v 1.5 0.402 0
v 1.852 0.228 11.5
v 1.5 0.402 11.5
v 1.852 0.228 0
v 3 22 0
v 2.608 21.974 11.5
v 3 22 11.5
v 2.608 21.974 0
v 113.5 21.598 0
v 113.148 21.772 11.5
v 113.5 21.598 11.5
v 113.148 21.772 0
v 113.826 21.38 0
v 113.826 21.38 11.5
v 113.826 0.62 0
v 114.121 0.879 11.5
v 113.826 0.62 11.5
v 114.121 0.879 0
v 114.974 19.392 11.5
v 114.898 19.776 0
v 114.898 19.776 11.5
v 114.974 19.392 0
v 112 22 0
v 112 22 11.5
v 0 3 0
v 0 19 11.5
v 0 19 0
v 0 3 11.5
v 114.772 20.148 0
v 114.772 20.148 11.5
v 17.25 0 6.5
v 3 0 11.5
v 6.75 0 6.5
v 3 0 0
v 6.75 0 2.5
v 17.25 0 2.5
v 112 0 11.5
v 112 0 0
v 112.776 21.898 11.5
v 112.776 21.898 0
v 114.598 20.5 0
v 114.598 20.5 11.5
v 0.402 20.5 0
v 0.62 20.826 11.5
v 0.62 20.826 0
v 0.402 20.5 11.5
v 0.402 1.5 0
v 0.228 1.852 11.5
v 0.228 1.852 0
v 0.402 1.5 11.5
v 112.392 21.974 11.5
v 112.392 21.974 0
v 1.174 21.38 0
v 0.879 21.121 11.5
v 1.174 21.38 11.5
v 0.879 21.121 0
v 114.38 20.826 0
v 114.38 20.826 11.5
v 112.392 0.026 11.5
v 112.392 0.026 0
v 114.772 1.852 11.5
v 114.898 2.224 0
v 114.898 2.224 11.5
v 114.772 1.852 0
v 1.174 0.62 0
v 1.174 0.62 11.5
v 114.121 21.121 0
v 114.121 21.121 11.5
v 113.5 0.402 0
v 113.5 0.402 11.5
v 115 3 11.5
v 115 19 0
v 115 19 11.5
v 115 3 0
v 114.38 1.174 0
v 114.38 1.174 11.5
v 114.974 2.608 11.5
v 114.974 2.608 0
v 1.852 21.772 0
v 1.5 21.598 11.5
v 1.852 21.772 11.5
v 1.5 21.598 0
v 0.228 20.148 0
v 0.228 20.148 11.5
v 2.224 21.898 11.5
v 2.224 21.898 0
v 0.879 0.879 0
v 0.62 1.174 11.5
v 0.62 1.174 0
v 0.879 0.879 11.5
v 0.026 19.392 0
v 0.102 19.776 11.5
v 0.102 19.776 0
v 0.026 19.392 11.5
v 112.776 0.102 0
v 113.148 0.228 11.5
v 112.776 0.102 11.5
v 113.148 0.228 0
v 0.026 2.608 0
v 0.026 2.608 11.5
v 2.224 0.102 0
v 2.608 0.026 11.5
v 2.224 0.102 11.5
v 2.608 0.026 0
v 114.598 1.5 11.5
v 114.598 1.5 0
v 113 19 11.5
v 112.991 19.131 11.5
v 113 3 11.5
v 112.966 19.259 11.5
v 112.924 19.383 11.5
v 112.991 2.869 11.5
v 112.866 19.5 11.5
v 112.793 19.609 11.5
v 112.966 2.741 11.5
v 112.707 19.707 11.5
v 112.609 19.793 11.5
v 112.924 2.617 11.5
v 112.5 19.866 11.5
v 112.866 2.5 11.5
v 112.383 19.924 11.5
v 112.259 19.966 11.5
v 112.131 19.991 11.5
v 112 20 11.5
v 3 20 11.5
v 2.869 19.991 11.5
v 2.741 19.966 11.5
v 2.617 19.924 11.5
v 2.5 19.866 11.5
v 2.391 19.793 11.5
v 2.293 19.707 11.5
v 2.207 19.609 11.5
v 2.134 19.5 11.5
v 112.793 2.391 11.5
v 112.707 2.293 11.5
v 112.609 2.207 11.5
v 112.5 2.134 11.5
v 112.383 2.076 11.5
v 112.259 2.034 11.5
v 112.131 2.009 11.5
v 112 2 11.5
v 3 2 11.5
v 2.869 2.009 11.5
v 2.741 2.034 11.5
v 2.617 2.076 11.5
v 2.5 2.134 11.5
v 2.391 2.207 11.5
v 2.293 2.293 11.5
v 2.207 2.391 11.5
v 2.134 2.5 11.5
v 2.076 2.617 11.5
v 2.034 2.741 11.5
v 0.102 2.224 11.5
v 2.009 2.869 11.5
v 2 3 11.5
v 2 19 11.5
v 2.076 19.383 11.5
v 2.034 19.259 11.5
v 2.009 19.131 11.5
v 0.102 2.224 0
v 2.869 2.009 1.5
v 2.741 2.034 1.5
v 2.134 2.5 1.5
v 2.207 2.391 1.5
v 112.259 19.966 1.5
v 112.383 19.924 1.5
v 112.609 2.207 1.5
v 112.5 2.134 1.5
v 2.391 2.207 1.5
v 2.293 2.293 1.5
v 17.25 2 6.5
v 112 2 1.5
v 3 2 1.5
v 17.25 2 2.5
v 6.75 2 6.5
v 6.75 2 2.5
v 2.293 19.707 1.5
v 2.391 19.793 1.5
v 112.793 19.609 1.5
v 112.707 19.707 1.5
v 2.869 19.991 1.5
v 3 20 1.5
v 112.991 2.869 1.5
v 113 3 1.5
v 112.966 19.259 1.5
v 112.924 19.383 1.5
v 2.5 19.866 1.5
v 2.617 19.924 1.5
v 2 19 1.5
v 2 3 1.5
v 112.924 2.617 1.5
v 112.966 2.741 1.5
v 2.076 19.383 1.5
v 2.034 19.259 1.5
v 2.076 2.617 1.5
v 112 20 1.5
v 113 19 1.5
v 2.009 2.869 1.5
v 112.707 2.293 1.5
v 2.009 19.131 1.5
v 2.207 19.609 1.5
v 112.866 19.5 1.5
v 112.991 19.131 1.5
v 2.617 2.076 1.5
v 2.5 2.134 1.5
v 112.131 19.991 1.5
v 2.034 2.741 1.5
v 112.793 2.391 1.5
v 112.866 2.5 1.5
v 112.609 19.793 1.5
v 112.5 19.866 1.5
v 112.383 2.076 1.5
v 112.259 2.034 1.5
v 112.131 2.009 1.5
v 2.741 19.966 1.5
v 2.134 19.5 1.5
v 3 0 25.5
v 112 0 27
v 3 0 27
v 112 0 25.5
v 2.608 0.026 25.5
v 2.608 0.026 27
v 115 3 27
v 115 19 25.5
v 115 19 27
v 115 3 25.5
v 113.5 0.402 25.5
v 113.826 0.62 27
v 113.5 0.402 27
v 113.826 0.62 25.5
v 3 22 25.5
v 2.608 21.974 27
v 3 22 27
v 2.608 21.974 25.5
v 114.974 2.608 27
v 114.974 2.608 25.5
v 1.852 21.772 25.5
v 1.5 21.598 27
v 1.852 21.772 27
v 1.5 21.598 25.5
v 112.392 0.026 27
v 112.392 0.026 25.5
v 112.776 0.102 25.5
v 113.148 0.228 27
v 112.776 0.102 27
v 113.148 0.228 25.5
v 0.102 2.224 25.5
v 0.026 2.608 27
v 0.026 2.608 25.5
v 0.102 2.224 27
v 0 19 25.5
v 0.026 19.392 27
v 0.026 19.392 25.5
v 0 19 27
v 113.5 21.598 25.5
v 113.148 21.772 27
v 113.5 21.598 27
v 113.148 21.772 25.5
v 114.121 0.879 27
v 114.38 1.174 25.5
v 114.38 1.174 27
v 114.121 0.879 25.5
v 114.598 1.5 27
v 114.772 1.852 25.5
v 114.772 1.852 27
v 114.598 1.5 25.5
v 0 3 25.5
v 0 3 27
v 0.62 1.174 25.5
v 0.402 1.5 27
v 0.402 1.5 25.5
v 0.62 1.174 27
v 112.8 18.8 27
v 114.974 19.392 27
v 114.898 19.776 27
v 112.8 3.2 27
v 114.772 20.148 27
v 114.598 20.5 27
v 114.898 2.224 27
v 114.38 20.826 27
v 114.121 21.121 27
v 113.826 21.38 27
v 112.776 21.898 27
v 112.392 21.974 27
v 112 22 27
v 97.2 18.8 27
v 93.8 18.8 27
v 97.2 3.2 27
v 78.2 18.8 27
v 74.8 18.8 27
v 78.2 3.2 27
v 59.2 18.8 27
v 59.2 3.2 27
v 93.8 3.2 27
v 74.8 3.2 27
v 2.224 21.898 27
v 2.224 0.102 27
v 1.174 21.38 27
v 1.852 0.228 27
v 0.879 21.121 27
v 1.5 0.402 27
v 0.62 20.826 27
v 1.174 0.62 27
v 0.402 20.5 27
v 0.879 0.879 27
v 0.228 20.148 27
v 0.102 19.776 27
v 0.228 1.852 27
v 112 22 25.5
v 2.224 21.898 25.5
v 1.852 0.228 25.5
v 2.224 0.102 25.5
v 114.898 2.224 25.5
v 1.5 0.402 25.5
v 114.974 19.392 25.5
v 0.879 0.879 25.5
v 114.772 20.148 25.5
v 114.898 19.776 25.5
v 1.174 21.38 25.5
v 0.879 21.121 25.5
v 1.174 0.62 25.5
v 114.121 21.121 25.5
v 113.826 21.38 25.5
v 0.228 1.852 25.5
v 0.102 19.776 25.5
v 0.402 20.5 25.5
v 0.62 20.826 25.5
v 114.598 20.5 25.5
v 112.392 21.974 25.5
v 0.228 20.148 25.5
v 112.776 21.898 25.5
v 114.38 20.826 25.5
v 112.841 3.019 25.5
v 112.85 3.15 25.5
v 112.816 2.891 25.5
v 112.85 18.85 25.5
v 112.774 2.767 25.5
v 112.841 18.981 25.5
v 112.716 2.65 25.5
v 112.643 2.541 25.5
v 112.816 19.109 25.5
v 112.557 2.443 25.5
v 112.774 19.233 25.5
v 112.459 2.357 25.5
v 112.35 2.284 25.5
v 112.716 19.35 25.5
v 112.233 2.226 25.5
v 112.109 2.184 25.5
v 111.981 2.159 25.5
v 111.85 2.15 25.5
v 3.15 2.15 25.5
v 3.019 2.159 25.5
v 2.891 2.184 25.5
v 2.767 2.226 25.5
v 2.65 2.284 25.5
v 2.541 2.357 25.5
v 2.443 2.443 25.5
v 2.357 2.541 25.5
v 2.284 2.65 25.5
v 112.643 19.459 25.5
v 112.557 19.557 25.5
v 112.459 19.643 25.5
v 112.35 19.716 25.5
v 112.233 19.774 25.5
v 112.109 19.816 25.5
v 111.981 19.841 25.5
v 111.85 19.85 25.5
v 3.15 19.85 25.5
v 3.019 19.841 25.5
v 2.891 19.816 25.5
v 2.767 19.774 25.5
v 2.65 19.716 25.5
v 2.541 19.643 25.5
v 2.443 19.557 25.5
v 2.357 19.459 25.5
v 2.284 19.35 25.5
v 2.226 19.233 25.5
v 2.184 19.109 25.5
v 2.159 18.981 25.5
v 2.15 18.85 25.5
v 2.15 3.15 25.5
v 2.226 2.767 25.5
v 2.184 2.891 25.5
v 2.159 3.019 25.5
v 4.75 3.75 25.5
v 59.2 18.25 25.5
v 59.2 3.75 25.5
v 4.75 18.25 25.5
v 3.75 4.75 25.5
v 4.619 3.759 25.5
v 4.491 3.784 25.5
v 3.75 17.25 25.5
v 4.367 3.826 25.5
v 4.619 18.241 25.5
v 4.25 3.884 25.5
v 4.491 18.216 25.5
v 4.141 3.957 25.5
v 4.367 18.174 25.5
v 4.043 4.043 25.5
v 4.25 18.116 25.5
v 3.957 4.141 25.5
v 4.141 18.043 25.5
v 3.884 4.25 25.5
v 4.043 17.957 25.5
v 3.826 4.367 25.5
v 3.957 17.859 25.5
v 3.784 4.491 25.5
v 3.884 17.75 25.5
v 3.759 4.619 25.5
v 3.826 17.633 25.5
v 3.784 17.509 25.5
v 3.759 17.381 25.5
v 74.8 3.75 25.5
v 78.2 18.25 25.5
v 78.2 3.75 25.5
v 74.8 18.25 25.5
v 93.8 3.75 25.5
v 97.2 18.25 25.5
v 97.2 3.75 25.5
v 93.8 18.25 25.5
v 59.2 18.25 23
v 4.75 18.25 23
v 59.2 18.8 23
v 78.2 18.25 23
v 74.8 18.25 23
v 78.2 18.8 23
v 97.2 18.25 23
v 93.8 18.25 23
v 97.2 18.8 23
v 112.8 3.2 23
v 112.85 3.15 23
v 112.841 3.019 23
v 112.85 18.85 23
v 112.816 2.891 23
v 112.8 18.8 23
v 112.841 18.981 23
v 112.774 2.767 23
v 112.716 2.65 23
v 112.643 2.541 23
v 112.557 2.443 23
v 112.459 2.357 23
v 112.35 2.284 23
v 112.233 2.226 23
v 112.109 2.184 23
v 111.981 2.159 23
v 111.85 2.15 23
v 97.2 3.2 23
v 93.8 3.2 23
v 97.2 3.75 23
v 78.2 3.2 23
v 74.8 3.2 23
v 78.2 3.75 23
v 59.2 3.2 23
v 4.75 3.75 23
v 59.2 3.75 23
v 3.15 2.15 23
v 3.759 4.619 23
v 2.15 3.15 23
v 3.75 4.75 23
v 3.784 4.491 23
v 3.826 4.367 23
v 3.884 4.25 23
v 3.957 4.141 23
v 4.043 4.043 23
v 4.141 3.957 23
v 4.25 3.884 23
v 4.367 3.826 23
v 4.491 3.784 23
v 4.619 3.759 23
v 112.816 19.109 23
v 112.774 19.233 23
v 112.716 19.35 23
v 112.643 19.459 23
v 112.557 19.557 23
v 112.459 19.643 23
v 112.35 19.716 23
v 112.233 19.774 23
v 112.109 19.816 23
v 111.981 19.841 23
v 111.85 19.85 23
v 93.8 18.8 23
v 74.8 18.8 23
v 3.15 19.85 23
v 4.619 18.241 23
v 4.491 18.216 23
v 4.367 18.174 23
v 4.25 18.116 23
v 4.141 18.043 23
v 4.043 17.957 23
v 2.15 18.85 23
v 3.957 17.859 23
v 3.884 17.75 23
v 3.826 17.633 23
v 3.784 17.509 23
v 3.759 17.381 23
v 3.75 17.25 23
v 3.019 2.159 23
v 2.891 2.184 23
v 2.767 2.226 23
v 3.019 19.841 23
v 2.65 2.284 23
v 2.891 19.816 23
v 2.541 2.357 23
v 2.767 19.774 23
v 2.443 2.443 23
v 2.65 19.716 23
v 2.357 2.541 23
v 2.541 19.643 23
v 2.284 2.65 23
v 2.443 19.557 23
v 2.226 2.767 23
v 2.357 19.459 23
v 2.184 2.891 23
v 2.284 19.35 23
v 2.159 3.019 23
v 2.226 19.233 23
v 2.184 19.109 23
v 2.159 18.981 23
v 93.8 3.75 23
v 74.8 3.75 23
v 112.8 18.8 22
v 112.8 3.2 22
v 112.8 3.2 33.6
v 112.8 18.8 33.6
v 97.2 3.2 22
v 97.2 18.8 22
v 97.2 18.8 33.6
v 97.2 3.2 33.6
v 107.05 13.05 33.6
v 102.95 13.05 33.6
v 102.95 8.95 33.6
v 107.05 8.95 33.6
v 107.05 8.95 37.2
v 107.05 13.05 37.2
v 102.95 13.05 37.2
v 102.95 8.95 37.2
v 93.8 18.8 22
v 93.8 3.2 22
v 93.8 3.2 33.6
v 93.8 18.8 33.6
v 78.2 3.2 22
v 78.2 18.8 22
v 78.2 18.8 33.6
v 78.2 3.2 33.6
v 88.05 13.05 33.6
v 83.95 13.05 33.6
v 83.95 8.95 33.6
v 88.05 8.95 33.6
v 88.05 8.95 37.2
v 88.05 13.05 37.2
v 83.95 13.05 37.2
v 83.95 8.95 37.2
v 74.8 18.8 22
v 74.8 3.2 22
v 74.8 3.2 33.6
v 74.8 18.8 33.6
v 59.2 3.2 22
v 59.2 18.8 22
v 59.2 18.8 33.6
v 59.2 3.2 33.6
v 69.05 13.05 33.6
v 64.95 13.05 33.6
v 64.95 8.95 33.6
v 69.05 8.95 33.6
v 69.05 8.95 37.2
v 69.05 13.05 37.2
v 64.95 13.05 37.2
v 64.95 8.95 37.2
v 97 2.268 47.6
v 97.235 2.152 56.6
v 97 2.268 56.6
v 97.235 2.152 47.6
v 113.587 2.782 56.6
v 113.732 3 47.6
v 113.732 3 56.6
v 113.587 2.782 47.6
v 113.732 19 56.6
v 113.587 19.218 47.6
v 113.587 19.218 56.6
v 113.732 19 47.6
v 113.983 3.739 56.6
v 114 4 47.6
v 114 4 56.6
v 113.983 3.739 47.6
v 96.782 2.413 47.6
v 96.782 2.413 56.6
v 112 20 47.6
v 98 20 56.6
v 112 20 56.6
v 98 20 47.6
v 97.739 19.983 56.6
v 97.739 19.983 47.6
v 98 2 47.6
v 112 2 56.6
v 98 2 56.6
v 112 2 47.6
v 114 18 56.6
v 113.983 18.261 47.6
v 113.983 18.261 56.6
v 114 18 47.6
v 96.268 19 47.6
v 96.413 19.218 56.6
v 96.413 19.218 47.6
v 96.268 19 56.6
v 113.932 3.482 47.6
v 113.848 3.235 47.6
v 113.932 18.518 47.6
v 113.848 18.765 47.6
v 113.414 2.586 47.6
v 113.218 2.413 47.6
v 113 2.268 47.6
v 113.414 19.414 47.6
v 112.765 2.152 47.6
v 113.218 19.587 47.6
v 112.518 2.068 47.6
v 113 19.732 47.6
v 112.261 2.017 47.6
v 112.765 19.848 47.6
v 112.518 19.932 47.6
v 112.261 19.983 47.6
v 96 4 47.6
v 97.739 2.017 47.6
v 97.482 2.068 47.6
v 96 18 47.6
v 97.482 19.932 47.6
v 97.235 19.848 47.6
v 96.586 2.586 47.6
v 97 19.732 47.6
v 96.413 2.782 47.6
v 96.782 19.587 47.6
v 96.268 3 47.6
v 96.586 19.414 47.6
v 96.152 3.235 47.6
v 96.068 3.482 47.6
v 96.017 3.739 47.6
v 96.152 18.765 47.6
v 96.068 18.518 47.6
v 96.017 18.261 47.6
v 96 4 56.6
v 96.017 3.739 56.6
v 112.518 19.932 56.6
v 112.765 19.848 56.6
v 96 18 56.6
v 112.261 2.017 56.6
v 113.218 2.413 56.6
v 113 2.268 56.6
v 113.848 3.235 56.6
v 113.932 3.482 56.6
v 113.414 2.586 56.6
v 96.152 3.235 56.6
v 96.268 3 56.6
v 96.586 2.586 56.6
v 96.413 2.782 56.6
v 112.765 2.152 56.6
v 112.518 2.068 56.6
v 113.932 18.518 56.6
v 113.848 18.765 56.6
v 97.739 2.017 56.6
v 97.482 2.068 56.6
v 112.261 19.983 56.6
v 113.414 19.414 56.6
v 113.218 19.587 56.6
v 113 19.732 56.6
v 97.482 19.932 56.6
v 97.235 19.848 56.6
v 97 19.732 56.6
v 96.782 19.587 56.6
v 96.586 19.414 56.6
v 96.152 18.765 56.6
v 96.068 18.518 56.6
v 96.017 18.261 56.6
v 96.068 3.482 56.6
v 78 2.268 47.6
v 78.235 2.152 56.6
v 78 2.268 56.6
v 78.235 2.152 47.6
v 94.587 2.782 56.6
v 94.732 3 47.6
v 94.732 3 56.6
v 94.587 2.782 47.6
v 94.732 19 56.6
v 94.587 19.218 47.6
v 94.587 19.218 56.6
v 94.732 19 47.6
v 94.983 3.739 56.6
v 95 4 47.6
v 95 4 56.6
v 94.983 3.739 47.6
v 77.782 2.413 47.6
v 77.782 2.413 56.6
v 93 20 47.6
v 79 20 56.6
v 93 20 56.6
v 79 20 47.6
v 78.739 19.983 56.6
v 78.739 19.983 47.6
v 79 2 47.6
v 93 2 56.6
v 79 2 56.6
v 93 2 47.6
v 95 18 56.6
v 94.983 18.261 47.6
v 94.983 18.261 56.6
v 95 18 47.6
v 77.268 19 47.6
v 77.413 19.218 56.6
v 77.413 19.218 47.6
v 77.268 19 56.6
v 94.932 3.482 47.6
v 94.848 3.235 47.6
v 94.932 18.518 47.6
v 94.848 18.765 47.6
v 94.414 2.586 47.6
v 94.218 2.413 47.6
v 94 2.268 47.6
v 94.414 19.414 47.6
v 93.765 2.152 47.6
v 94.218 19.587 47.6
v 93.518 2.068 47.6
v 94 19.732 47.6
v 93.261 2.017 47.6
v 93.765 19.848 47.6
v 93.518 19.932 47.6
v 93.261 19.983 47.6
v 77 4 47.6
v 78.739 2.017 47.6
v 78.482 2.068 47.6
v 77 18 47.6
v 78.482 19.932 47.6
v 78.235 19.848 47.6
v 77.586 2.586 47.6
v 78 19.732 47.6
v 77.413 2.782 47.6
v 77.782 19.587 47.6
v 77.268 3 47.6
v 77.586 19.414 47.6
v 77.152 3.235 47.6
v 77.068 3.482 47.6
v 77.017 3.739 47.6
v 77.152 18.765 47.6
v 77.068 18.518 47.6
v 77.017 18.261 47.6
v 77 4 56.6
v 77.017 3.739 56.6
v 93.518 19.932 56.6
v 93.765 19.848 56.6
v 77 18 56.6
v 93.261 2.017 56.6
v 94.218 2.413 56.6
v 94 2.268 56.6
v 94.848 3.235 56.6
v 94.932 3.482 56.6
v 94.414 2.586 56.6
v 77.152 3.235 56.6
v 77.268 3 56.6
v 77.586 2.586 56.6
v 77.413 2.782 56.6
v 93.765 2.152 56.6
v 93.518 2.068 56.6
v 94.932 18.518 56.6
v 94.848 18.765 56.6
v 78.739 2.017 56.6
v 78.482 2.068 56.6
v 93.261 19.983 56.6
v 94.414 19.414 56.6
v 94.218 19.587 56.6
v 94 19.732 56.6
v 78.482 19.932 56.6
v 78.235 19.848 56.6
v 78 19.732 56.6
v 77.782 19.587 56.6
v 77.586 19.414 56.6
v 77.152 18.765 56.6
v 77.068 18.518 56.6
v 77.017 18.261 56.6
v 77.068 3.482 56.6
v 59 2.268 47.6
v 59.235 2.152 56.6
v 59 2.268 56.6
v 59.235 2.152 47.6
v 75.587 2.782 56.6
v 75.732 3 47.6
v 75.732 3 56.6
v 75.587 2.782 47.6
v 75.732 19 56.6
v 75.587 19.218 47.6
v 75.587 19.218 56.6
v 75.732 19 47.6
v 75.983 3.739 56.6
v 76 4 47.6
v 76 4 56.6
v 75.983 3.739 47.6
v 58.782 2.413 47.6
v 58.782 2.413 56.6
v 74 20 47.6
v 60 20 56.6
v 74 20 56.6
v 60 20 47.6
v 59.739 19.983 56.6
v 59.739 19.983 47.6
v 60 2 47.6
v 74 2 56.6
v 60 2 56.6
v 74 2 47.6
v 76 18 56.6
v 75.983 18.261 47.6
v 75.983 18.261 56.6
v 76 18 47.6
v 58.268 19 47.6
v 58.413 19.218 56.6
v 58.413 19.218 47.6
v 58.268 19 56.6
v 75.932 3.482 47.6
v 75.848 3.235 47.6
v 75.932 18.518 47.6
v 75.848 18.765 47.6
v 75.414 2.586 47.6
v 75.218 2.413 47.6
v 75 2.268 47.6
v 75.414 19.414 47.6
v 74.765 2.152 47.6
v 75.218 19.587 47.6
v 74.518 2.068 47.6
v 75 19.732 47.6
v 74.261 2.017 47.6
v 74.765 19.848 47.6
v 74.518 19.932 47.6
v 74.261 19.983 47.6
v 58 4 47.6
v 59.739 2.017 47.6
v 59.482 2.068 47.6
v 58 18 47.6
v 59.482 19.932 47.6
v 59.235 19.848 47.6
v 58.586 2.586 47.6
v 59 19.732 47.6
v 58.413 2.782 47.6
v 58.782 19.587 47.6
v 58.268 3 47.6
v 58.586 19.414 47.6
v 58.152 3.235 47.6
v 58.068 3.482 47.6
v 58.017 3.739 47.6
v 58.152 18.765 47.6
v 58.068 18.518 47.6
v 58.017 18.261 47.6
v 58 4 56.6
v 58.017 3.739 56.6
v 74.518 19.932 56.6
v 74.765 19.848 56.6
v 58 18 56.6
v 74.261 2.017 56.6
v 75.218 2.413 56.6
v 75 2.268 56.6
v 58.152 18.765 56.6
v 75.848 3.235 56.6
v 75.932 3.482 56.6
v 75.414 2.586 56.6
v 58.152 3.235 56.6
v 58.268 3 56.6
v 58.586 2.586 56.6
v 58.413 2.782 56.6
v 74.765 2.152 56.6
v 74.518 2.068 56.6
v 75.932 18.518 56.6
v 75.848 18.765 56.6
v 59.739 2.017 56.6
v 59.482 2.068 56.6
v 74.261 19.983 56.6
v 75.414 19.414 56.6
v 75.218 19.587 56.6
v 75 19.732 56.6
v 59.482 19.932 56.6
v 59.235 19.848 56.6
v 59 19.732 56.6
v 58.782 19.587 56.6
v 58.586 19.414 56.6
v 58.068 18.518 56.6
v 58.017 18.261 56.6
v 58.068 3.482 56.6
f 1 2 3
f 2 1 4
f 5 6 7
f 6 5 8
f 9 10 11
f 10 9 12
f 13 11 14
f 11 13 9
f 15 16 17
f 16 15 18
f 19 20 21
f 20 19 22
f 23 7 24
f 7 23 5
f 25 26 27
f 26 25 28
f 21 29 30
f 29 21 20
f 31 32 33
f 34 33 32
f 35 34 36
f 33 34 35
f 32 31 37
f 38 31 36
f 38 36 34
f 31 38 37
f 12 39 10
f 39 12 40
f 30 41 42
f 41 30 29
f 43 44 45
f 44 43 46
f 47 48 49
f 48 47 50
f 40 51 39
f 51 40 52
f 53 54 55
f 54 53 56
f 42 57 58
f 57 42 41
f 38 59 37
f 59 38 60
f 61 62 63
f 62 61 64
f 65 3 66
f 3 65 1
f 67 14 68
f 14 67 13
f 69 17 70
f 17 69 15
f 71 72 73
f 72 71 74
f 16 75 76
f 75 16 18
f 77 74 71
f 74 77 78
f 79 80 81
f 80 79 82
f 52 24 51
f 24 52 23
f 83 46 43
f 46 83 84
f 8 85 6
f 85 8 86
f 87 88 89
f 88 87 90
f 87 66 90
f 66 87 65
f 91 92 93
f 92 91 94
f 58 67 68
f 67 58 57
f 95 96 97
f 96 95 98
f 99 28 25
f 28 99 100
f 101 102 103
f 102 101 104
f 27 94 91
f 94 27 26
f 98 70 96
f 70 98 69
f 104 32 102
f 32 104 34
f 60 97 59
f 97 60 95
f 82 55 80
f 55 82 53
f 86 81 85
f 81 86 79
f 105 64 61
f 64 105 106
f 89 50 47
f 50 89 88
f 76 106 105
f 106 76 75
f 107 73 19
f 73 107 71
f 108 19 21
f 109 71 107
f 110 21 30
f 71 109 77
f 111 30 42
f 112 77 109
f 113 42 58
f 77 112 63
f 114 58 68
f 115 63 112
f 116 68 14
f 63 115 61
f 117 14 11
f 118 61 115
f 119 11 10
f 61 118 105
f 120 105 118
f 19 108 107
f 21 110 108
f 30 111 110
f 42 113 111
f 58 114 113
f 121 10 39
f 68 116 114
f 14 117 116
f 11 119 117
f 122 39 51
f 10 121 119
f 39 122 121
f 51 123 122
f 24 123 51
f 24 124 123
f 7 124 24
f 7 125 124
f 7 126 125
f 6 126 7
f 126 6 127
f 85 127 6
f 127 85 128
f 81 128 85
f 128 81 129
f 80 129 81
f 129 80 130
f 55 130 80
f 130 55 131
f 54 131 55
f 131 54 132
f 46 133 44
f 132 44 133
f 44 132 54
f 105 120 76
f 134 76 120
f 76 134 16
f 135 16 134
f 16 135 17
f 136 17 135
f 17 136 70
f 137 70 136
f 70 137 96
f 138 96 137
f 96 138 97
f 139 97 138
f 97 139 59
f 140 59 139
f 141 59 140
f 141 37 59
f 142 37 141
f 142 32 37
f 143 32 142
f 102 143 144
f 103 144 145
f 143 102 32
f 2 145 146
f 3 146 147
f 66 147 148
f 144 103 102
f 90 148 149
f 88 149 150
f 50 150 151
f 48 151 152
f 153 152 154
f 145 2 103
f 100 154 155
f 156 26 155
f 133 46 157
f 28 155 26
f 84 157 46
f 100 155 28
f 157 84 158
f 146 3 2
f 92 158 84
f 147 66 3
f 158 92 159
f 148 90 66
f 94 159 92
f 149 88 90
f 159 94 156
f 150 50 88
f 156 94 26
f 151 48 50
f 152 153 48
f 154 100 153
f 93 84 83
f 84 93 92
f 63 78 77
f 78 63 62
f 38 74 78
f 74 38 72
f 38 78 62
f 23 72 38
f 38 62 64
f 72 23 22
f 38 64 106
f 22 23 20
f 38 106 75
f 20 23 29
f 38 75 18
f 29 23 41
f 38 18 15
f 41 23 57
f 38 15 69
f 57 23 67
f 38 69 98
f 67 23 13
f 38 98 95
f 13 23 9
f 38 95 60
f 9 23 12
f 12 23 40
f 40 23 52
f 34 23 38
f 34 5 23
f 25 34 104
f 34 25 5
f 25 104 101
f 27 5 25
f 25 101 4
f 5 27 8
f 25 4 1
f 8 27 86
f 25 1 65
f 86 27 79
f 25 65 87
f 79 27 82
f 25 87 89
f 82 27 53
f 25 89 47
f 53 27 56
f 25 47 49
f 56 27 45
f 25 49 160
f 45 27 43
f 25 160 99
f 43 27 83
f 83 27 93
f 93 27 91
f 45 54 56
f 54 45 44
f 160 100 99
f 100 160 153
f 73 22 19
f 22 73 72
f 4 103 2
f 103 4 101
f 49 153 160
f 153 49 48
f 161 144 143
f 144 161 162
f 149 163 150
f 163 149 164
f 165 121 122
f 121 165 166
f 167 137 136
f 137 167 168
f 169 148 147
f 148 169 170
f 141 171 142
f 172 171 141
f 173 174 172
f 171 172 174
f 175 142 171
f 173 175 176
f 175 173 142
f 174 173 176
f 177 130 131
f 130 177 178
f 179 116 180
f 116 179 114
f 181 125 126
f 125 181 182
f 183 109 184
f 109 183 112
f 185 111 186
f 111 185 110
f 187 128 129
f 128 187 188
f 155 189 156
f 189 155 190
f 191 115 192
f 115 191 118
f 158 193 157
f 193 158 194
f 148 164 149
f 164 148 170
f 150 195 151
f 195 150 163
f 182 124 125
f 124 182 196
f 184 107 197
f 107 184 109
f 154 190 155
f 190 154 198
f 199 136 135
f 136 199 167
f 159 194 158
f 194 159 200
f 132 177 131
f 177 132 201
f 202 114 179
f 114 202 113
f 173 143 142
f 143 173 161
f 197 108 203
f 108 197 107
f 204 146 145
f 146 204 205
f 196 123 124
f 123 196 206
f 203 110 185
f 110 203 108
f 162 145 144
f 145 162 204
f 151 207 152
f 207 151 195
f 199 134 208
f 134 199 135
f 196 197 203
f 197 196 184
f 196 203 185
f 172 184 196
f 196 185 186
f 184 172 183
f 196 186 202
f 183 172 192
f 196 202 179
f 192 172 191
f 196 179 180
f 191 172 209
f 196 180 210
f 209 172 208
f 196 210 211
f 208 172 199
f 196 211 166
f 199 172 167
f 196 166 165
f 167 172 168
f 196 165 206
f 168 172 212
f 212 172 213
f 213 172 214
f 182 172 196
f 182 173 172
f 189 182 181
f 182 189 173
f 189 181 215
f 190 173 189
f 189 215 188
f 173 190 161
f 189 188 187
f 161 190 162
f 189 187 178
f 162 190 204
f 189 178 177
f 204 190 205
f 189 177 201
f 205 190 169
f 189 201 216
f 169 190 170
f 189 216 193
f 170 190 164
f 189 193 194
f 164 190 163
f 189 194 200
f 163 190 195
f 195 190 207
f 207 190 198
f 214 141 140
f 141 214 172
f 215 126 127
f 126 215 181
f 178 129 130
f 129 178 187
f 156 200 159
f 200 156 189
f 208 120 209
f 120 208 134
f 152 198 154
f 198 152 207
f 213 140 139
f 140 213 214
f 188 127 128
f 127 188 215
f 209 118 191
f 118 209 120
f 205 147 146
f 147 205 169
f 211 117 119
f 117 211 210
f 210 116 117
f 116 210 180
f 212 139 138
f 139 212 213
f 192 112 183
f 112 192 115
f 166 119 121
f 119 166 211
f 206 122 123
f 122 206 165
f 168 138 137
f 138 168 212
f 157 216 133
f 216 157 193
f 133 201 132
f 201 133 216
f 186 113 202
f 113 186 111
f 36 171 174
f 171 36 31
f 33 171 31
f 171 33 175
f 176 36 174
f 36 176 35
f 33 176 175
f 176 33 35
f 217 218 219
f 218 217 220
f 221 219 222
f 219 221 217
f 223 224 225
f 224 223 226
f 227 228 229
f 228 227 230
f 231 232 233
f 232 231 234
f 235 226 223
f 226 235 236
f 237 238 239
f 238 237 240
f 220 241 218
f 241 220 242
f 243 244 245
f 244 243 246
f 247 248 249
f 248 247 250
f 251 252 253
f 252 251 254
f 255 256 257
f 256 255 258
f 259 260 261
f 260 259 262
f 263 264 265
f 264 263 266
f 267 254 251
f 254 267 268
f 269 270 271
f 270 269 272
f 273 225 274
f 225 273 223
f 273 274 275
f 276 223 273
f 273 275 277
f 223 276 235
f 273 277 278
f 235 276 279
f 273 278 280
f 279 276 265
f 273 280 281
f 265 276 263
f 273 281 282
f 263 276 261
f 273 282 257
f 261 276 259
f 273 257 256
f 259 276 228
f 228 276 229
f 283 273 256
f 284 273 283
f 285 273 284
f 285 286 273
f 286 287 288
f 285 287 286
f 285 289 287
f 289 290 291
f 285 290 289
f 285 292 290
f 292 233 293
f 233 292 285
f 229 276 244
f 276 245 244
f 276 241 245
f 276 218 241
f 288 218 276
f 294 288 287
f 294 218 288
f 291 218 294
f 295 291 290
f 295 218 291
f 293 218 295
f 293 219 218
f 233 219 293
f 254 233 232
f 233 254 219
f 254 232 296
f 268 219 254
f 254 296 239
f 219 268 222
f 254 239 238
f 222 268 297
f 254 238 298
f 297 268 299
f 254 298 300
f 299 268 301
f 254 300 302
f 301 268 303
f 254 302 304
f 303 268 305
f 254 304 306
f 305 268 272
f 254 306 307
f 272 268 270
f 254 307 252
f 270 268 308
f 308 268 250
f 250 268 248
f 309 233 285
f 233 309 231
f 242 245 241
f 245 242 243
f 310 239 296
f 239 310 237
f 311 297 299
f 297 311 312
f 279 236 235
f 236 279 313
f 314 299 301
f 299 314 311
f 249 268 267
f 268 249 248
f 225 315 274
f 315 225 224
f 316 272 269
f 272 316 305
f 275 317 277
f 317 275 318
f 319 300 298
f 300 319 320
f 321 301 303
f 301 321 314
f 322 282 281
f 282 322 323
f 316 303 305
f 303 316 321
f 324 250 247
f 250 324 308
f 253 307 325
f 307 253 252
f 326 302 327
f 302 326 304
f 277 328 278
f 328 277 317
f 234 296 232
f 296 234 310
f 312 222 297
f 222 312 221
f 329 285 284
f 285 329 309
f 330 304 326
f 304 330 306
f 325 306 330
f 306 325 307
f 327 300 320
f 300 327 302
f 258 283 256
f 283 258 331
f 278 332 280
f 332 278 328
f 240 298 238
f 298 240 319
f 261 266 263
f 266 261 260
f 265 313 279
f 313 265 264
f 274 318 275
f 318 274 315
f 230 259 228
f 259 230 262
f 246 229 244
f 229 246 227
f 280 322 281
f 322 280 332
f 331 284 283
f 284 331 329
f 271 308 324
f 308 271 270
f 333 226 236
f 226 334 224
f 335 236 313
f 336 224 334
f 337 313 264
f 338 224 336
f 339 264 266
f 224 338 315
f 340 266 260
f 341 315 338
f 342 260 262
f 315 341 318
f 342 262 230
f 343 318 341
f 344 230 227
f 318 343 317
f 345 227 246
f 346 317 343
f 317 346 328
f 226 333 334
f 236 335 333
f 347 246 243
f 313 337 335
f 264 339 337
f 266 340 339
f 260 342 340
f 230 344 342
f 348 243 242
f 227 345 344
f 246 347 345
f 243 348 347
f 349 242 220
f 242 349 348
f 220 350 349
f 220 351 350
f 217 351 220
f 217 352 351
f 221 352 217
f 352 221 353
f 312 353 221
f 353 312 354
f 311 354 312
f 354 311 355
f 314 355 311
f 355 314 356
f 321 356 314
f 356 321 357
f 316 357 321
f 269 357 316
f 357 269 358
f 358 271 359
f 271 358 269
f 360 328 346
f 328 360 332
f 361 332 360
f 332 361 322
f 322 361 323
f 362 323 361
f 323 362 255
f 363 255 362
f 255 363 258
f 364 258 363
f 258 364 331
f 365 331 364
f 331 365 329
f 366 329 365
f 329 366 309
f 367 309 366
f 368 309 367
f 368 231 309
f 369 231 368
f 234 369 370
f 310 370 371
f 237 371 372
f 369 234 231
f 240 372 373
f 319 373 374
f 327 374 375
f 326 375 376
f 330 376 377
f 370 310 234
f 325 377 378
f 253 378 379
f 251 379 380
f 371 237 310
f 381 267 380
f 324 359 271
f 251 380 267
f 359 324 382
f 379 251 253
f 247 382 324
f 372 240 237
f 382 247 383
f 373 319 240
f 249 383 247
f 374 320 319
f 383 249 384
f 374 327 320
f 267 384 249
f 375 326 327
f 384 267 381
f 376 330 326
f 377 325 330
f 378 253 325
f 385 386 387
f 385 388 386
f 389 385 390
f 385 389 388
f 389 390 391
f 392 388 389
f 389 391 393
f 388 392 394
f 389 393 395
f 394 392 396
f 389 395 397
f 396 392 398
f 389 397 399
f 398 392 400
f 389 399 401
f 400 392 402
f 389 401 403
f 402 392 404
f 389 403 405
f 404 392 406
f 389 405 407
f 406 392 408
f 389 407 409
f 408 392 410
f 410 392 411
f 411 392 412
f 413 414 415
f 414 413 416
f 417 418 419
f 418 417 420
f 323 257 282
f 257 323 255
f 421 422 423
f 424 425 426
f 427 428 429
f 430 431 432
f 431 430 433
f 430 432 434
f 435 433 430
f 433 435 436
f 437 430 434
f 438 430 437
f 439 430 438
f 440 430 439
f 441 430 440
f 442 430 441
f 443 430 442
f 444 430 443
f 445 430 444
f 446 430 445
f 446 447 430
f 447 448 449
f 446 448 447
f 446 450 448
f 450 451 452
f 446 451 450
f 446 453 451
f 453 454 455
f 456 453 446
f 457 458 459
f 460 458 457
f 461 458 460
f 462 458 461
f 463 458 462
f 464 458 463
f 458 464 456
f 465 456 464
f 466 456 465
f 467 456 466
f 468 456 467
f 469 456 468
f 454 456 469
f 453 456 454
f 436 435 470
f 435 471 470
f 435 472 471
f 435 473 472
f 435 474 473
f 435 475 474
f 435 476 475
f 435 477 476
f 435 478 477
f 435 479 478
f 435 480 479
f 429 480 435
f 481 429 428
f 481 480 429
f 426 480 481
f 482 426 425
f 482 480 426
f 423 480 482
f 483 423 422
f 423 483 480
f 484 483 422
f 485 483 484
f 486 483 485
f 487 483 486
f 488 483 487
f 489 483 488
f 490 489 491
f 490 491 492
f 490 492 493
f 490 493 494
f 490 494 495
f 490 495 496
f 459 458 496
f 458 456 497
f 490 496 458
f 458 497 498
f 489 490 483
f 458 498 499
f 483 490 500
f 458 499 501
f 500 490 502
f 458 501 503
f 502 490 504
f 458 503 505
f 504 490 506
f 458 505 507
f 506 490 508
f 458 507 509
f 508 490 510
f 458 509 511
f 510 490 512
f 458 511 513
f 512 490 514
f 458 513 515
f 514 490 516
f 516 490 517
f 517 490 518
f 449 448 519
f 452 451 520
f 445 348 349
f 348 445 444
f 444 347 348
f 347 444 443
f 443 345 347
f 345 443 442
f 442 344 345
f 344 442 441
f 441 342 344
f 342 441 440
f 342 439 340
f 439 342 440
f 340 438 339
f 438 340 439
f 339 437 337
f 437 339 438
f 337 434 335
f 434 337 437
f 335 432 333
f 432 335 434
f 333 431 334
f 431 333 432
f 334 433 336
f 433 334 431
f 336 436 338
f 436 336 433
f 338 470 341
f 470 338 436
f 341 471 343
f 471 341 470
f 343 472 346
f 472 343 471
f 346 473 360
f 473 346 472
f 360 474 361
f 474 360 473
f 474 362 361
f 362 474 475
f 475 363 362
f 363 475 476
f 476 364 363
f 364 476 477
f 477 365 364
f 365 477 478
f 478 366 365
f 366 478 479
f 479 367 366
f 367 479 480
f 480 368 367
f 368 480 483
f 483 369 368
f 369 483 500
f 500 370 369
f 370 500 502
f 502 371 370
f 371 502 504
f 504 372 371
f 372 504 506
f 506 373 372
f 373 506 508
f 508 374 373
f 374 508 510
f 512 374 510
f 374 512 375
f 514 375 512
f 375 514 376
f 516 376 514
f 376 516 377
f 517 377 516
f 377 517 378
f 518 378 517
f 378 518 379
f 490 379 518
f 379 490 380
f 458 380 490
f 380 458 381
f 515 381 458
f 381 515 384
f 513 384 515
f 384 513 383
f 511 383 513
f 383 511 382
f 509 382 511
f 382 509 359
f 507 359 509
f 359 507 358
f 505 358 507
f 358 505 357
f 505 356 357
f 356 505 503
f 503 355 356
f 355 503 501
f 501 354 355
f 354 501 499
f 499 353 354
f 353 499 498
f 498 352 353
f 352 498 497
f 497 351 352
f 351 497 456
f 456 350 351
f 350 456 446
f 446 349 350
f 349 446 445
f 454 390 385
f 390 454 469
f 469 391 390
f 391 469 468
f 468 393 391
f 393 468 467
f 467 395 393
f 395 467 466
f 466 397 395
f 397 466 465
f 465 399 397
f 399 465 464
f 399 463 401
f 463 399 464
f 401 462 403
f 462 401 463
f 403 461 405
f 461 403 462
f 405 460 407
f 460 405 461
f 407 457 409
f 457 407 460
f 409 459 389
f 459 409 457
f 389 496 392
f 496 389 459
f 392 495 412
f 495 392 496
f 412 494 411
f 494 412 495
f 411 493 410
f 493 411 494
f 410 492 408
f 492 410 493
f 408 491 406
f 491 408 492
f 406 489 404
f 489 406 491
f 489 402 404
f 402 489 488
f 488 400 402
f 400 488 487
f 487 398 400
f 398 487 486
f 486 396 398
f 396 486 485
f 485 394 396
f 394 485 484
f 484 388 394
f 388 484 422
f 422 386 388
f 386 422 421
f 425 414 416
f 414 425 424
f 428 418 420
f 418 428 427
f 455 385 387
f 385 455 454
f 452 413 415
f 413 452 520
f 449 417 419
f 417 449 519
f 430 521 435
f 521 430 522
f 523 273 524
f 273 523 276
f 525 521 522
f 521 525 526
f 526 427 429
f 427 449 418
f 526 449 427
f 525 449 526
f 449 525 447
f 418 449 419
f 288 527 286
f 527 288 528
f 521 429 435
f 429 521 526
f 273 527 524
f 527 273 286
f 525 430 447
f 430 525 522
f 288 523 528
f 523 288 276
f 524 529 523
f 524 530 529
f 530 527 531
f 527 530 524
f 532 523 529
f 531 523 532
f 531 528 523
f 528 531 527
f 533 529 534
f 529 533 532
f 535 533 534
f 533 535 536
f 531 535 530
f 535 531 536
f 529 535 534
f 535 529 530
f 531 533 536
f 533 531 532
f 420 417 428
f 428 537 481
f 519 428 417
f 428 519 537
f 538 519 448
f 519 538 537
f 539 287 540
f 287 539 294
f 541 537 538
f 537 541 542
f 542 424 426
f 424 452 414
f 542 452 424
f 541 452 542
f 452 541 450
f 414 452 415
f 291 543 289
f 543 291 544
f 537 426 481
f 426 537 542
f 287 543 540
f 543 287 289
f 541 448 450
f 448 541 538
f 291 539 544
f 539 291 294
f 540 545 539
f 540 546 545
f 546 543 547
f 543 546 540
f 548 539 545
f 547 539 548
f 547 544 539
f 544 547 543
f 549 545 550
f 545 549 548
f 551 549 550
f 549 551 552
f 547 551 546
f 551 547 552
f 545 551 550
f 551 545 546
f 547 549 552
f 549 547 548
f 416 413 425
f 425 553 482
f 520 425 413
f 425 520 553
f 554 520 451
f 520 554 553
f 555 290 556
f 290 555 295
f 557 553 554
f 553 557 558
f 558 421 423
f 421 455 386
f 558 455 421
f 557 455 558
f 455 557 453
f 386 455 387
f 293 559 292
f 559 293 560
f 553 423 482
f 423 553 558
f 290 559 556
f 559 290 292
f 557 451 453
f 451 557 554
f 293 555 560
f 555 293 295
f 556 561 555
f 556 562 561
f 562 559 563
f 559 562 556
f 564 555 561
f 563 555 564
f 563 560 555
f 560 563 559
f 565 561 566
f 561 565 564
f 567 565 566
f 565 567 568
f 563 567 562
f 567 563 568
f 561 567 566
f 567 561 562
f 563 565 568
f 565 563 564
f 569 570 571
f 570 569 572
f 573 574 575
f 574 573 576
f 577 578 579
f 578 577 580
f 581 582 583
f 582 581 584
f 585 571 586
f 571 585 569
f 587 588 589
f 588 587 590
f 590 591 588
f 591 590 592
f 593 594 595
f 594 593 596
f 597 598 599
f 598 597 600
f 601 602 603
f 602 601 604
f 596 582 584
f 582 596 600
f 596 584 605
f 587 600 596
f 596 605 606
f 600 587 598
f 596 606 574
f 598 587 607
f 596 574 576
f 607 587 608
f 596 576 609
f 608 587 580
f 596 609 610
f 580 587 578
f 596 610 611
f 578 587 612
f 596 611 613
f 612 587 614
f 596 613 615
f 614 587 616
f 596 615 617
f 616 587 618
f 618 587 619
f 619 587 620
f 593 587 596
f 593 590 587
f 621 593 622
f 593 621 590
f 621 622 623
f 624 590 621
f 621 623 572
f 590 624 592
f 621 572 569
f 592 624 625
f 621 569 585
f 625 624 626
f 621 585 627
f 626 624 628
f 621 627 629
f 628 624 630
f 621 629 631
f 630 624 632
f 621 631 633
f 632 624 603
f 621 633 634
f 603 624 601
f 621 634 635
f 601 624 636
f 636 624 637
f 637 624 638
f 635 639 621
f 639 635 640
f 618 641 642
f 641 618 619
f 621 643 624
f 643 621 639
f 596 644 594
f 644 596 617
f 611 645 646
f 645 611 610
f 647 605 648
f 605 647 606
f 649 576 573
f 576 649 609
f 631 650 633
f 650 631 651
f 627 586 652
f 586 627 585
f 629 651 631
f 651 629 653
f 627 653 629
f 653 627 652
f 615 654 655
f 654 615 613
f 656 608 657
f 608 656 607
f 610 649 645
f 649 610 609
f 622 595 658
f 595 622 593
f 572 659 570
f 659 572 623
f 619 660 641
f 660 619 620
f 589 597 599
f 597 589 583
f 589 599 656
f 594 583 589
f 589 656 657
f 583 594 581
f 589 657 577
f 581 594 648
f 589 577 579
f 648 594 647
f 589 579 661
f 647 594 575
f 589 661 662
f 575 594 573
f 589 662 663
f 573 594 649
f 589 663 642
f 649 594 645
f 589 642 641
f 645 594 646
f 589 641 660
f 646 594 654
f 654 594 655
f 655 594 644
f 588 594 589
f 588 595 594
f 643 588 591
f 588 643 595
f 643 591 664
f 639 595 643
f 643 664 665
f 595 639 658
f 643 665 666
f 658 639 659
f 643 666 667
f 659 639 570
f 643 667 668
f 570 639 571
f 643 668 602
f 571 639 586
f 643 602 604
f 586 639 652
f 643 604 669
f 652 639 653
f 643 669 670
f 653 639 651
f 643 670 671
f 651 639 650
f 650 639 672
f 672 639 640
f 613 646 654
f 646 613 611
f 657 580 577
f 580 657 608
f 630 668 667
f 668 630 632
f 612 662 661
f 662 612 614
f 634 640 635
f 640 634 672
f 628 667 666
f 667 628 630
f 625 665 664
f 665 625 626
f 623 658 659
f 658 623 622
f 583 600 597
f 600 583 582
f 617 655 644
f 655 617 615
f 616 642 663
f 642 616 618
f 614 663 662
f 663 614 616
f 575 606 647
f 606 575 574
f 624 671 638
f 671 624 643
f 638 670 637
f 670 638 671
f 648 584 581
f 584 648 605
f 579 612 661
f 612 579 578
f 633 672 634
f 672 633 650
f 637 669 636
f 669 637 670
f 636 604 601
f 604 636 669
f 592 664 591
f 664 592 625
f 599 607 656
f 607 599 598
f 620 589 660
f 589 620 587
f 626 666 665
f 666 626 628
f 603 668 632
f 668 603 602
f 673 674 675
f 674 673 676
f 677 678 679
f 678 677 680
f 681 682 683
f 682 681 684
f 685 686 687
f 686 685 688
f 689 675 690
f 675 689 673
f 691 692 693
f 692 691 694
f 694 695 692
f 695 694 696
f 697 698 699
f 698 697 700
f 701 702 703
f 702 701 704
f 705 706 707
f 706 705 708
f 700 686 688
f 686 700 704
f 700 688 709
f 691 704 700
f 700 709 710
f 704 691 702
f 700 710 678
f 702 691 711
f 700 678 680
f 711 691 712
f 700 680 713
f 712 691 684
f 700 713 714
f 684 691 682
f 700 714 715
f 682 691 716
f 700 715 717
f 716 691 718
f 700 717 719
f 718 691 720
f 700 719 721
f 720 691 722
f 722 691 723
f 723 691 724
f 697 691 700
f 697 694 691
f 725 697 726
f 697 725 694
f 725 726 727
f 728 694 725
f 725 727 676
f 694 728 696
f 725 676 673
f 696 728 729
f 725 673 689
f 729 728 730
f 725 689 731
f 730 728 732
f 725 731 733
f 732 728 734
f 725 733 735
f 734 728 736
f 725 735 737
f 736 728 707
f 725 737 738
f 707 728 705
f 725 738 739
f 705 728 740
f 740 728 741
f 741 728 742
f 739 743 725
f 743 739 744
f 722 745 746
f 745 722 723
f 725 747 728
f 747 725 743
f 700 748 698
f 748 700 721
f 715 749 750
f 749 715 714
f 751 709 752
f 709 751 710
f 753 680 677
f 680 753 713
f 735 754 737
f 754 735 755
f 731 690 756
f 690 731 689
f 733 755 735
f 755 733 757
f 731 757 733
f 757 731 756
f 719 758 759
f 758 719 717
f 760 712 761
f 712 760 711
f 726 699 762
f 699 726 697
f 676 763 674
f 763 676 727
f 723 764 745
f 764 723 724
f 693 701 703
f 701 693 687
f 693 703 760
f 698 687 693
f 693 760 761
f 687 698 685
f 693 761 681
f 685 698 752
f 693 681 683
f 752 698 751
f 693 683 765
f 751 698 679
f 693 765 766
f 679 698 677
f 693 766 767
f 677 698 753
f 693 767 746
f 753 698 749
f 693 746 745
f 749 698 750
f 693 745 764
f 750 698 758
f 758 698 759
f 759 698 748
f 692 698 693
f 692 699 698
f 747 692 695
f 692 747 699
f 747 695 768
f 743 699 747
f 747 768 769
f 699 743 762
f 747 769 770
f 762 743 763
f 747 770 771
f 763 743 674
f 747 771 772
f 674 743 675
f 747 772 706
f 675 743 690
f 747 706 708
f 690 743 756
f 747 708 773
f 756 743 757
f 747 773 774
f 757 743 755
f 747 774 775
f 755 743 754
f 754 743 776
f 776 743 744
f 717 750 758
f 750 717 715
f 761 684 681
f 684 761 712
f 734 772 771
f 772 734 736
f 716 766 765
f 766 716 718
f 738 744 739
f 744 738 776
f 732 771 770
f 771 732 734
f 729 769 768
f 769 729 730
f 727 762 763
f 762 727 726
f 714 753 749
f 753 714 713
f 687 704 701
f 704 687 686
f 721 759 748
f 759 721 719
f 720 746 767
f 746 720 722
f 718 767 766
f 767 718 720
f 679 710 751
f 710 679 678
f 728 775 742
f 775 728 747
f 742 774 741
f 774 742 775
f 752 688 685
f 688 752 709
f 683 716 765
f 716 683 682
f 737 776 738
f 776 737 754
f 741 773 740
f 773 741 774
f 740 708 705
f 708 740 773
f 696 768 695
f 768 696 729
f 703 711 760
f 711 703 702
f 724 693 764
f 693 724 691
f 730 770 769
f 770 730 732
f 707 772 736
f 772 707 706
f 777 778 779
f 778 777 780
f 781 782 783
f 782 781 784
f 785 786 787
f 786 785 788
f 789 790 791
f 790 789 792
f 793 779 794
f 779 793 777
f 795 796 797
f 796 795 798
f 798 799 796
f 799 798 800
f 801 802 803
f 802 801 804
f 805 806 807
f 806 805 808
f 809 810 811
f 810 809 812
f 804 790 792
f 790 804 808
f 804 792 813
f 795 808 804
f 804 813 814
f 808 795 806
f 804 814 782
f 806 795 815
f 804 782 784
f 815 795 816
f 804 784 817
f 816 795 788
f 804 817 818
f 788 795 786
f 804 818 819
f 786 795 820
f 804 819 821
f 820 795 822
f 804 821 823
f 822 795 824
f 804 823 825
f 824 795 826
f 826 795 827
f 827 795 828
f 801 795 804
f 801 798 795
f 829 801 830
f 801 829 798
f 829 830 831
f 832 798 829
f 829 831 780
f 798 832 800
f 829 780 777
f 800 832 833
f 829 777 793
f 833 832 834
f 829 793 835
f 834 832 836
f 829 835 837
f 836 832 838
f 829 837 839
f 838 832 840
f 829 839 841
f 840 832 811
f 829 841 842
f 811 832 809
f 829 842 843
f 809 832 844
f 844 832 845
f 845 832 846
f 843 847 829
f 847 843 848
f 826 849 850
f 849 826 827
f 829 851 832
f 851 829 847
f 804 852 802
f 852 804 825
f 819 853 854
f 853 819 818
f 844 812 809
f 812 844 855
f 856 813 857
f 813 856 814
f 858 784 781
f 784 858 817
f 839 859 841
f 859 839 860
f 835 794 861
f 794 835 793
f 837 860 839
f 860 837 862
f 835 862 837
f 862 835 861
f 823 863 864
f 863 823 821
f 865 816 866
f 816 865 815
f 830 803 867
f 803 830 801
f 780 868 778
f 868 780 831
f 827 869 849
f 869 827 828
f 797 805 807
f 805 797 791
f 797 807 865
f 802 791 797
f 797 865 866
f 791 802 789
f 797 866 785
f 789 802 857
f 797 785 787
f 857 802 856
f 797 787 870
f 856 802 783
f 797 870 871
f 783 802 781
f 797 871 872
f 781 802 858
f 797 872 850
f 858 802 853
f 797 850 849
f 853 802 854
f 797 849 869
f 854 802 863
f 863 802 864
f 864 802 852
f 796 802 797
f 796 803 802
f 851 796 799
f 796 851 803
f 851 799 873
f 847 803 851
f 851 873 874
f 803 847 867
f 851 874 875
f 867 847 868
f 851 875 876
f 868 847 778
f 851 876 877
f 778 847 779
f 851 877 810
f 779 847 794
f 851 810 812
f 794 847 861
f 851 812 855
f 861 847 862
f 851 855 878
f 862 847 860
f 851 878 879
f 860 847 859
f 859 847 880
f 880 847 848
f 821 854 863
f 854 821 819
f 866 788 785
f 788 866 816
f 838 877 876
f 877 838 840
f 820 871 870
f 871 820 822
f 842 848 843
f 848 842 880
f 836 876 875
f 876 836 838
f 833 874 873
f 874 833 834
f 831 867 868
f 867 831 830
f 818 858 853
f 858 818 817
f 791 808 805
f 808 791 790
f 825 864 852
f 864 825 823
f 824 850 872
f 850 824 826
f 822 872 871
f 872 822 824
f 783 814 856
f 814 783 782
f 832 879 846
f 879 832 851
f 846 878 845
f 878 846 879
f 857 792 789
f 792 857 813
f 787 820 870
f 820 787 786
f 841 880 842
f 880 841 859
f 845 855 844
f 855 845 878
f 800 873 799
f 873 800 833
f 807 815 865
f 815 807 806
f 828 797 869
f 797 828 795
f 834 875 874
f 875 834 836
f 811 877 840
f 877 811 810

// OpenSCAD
// K1 (Keys v1) — printable 2-part concept, v0.4
// Parts: tray (electronics cavity) + friction-fit lid that doubles as an
// MX switch plate. Keycaps are printed separately (any MX cross-stem cap
// works — e.g. the Lego-style caps).
//
// Sized for MX-style clicky switches (PCB/plate mount, through-hole):
//   body 15.6 sq, plate cutout 14.0 sq in a 1.5mm plate (clips grab the
//   plate underside), lower housing ~5mm below plate, pins ~3.3mm more.
// Body/plug dimensions remain placeholders until the MacBook is measured.
//
// Render one part at a time:
//   openscad -D 'part="tray"' -o k1_tray.stl k1_v1_parts.scad
//   openscad -D 'part="lid"'  -o k1_lid.stl  k1_v1_parts.scad   (print orientation)
//   part="assembly" / part="exploded" for viewing (includes mock switches/caps)

part = "exploded"; // tray | lid | assembly | exploded

$fn = 48;

/* ---------- Body ---------- */
body_len  = 115;   // rear (port) to laptop front edge
body_wid  = 22;
body_rad  = 3;

wall      = 2;     // side wall thickness
floor_th  = 1.5;
cav_depth = 10;    // below-plate room: 5 switch + 3.3 pins + wiring

/* ---------- Lid = switch plate ---------- */
lid_th        = 1.5;   // MX clips are made for a 1.5mm plate — don't change
lid_rim_depth = 2.5;   // perimeter rim that friction-fits into the tray
lid_rim_wid   = 1.6;
fit_clr       = 0.15;  // per-side clearance, tune per printer

tray_ht = floor_th + cav_depth;          // 11.5
body_ht = tray_ht + lid_th;              // 13 (shell only, keys stick up)

/* ---------- Keys (MX) ---------- */
key_count       = 3;
key_pitch       = 19;    // MX standard
keys_from_front = 10;    // first key center from the front end
plate_hole      = 14.1;  // 14.0 nominal + print tolerance
sw_body         = 15.6;  // switch housing (for clearance checks / mock)
sw_upper_ht     = 6.6;   // housing above plate
sw_stem_ht      = 3.6;   // cross stem above housing

/* ---------- Keycap envelope (for mock/clearance only, printed separately) ---------- */
cap_size = 18;   // standard MX cap footprint, < 19 pitch
cap_ht   = 9;    // roughly the Lego-style cap height

/* ---------- USB-C slot (inner wall, near rear) ---------- */
plug_from_rear = 12;   // slot center from rear end
slot_w = 10.5;         // fits a male USB-C breakout plug
slot_h = 4;
slot_z = floor_th + 1; // bottom of slot above cavity floor

/* ---------- Derived ---------- */
cav_len = body_len - 2 * wall;
cav_wid = body_wid - 2 * wall;

function key_cx(i) = body_len - keys_from_front - i * key_pitch;

/* ---------- Helpers ---------- */
module rounded_box(l, w, h, r) {
    hull()
        for (x = [r, l - r], y = [r, w - r])
            translate([x, y, 0]) cylinder(h = h, r = r);
}

/* ---------- Parts ---------- */
// Frame: X rear->front, Y=0 face touches the laptop, Z up.

module tray() {
    difference() {
        rounded_box(body_len, body_wid, tray_ht, body_rad);
        // cavity
        translate([wall, wall, floor_th])
            rounded_box(cav_len, cav_wid, tray_ht, 1);
        // USB-C slot through the inner (Y=0) wall
        translate([plug_from_rear - slot_w / 2, -1, slot_z])
            cube([slot_w, wall + 2, slot_h]);
    }
}

// Modeled in assembly orientation: plate z=0..lid_th, rim hangs below.
module lid_assembled() {
    difference() {
        union() {
            rounded_box(body_len, body_wid, lid_th, body_rad);
            // friction rim: band just inside the cavity walls
            translate([0, 0, -lid_rim_depth])
                linear_extrude(lid_rim_depth)
                    difference() {
                        translate([wall + fit_clr, wall + fit_clr])
                            projection()
                                rounded_box(cav_len - 2 * fit_clr,
                                            cav_wid - 2 * fit_clr, 1, 1);
                        translate([wall + fit_clr + lid_rim_wid,
                                   wall + fit_clr + lid_rim_wid])
                            projection()
                                rounded_box(cav_len - 2 * (fit_clr + lid_rim_wid),
                                            cav_wid - 2 * (fit_clr + lid_rim_wid), 1, 1);
                    }
        }
        // MX plate cutouts — switches drop in from the top and clip under
        for (i = [0 : key_count - 1])
            translate([key_cx(i) - plate_hole / 2,
                       (body_wid - plate_hole) / 2,
                       -lid_rim_depth - 1])
                cube([plate_hole, plate_hole, lid_rim_depth + lid_th + 2]);
    }
}

// Mock MX switch for assembly views only (not exported)
module switch_mock() {
    color("gray") {
        translate([-sw_body / 2, -sw_body / 2, -5]) cube([sw_body, sw_body, 5]);
        translate([-sw_body / 2, -sw_body / 2, 0])  cube([sw_body, sw_body, sw_upper_ht]);
        translate([-2.05, -2.05, sw_upper_ht])      cube([4.1, 4.1, sw_stem_ht]);
    }
}

/* ---------- Views ---------- */

module assembly(explode = 0) {
    plate_top = tray_ht + lid_th;
    tray();
    translate([0, 0, tray_ht + explode]) lid_assembled();
    for (i = [0 : key_count - 1]) {
        translate([key_cx(i), body_wid / 2, plate_top + explode])
            switch_mock();
        // mock keycap (printed separately, seats over the stem)
        color("steelblue")
            translate([key_cx(i) - cap_size / 2, (body_wid - cap_size) / 2,
                       plate_top + sw_upper_ht + explode * 2])
                rounded_box(cap_size, cap_size, cap_ht, 2);
    }
}

if (part == "tray")          tray();
else if (part == "lid")      translate([0, body_wid, lid_th]) rotate([180, 0, 0]) lid_assembled();
else if (part == "assembly") assembly(0);
else if (part == "exploded") assembly(14);
